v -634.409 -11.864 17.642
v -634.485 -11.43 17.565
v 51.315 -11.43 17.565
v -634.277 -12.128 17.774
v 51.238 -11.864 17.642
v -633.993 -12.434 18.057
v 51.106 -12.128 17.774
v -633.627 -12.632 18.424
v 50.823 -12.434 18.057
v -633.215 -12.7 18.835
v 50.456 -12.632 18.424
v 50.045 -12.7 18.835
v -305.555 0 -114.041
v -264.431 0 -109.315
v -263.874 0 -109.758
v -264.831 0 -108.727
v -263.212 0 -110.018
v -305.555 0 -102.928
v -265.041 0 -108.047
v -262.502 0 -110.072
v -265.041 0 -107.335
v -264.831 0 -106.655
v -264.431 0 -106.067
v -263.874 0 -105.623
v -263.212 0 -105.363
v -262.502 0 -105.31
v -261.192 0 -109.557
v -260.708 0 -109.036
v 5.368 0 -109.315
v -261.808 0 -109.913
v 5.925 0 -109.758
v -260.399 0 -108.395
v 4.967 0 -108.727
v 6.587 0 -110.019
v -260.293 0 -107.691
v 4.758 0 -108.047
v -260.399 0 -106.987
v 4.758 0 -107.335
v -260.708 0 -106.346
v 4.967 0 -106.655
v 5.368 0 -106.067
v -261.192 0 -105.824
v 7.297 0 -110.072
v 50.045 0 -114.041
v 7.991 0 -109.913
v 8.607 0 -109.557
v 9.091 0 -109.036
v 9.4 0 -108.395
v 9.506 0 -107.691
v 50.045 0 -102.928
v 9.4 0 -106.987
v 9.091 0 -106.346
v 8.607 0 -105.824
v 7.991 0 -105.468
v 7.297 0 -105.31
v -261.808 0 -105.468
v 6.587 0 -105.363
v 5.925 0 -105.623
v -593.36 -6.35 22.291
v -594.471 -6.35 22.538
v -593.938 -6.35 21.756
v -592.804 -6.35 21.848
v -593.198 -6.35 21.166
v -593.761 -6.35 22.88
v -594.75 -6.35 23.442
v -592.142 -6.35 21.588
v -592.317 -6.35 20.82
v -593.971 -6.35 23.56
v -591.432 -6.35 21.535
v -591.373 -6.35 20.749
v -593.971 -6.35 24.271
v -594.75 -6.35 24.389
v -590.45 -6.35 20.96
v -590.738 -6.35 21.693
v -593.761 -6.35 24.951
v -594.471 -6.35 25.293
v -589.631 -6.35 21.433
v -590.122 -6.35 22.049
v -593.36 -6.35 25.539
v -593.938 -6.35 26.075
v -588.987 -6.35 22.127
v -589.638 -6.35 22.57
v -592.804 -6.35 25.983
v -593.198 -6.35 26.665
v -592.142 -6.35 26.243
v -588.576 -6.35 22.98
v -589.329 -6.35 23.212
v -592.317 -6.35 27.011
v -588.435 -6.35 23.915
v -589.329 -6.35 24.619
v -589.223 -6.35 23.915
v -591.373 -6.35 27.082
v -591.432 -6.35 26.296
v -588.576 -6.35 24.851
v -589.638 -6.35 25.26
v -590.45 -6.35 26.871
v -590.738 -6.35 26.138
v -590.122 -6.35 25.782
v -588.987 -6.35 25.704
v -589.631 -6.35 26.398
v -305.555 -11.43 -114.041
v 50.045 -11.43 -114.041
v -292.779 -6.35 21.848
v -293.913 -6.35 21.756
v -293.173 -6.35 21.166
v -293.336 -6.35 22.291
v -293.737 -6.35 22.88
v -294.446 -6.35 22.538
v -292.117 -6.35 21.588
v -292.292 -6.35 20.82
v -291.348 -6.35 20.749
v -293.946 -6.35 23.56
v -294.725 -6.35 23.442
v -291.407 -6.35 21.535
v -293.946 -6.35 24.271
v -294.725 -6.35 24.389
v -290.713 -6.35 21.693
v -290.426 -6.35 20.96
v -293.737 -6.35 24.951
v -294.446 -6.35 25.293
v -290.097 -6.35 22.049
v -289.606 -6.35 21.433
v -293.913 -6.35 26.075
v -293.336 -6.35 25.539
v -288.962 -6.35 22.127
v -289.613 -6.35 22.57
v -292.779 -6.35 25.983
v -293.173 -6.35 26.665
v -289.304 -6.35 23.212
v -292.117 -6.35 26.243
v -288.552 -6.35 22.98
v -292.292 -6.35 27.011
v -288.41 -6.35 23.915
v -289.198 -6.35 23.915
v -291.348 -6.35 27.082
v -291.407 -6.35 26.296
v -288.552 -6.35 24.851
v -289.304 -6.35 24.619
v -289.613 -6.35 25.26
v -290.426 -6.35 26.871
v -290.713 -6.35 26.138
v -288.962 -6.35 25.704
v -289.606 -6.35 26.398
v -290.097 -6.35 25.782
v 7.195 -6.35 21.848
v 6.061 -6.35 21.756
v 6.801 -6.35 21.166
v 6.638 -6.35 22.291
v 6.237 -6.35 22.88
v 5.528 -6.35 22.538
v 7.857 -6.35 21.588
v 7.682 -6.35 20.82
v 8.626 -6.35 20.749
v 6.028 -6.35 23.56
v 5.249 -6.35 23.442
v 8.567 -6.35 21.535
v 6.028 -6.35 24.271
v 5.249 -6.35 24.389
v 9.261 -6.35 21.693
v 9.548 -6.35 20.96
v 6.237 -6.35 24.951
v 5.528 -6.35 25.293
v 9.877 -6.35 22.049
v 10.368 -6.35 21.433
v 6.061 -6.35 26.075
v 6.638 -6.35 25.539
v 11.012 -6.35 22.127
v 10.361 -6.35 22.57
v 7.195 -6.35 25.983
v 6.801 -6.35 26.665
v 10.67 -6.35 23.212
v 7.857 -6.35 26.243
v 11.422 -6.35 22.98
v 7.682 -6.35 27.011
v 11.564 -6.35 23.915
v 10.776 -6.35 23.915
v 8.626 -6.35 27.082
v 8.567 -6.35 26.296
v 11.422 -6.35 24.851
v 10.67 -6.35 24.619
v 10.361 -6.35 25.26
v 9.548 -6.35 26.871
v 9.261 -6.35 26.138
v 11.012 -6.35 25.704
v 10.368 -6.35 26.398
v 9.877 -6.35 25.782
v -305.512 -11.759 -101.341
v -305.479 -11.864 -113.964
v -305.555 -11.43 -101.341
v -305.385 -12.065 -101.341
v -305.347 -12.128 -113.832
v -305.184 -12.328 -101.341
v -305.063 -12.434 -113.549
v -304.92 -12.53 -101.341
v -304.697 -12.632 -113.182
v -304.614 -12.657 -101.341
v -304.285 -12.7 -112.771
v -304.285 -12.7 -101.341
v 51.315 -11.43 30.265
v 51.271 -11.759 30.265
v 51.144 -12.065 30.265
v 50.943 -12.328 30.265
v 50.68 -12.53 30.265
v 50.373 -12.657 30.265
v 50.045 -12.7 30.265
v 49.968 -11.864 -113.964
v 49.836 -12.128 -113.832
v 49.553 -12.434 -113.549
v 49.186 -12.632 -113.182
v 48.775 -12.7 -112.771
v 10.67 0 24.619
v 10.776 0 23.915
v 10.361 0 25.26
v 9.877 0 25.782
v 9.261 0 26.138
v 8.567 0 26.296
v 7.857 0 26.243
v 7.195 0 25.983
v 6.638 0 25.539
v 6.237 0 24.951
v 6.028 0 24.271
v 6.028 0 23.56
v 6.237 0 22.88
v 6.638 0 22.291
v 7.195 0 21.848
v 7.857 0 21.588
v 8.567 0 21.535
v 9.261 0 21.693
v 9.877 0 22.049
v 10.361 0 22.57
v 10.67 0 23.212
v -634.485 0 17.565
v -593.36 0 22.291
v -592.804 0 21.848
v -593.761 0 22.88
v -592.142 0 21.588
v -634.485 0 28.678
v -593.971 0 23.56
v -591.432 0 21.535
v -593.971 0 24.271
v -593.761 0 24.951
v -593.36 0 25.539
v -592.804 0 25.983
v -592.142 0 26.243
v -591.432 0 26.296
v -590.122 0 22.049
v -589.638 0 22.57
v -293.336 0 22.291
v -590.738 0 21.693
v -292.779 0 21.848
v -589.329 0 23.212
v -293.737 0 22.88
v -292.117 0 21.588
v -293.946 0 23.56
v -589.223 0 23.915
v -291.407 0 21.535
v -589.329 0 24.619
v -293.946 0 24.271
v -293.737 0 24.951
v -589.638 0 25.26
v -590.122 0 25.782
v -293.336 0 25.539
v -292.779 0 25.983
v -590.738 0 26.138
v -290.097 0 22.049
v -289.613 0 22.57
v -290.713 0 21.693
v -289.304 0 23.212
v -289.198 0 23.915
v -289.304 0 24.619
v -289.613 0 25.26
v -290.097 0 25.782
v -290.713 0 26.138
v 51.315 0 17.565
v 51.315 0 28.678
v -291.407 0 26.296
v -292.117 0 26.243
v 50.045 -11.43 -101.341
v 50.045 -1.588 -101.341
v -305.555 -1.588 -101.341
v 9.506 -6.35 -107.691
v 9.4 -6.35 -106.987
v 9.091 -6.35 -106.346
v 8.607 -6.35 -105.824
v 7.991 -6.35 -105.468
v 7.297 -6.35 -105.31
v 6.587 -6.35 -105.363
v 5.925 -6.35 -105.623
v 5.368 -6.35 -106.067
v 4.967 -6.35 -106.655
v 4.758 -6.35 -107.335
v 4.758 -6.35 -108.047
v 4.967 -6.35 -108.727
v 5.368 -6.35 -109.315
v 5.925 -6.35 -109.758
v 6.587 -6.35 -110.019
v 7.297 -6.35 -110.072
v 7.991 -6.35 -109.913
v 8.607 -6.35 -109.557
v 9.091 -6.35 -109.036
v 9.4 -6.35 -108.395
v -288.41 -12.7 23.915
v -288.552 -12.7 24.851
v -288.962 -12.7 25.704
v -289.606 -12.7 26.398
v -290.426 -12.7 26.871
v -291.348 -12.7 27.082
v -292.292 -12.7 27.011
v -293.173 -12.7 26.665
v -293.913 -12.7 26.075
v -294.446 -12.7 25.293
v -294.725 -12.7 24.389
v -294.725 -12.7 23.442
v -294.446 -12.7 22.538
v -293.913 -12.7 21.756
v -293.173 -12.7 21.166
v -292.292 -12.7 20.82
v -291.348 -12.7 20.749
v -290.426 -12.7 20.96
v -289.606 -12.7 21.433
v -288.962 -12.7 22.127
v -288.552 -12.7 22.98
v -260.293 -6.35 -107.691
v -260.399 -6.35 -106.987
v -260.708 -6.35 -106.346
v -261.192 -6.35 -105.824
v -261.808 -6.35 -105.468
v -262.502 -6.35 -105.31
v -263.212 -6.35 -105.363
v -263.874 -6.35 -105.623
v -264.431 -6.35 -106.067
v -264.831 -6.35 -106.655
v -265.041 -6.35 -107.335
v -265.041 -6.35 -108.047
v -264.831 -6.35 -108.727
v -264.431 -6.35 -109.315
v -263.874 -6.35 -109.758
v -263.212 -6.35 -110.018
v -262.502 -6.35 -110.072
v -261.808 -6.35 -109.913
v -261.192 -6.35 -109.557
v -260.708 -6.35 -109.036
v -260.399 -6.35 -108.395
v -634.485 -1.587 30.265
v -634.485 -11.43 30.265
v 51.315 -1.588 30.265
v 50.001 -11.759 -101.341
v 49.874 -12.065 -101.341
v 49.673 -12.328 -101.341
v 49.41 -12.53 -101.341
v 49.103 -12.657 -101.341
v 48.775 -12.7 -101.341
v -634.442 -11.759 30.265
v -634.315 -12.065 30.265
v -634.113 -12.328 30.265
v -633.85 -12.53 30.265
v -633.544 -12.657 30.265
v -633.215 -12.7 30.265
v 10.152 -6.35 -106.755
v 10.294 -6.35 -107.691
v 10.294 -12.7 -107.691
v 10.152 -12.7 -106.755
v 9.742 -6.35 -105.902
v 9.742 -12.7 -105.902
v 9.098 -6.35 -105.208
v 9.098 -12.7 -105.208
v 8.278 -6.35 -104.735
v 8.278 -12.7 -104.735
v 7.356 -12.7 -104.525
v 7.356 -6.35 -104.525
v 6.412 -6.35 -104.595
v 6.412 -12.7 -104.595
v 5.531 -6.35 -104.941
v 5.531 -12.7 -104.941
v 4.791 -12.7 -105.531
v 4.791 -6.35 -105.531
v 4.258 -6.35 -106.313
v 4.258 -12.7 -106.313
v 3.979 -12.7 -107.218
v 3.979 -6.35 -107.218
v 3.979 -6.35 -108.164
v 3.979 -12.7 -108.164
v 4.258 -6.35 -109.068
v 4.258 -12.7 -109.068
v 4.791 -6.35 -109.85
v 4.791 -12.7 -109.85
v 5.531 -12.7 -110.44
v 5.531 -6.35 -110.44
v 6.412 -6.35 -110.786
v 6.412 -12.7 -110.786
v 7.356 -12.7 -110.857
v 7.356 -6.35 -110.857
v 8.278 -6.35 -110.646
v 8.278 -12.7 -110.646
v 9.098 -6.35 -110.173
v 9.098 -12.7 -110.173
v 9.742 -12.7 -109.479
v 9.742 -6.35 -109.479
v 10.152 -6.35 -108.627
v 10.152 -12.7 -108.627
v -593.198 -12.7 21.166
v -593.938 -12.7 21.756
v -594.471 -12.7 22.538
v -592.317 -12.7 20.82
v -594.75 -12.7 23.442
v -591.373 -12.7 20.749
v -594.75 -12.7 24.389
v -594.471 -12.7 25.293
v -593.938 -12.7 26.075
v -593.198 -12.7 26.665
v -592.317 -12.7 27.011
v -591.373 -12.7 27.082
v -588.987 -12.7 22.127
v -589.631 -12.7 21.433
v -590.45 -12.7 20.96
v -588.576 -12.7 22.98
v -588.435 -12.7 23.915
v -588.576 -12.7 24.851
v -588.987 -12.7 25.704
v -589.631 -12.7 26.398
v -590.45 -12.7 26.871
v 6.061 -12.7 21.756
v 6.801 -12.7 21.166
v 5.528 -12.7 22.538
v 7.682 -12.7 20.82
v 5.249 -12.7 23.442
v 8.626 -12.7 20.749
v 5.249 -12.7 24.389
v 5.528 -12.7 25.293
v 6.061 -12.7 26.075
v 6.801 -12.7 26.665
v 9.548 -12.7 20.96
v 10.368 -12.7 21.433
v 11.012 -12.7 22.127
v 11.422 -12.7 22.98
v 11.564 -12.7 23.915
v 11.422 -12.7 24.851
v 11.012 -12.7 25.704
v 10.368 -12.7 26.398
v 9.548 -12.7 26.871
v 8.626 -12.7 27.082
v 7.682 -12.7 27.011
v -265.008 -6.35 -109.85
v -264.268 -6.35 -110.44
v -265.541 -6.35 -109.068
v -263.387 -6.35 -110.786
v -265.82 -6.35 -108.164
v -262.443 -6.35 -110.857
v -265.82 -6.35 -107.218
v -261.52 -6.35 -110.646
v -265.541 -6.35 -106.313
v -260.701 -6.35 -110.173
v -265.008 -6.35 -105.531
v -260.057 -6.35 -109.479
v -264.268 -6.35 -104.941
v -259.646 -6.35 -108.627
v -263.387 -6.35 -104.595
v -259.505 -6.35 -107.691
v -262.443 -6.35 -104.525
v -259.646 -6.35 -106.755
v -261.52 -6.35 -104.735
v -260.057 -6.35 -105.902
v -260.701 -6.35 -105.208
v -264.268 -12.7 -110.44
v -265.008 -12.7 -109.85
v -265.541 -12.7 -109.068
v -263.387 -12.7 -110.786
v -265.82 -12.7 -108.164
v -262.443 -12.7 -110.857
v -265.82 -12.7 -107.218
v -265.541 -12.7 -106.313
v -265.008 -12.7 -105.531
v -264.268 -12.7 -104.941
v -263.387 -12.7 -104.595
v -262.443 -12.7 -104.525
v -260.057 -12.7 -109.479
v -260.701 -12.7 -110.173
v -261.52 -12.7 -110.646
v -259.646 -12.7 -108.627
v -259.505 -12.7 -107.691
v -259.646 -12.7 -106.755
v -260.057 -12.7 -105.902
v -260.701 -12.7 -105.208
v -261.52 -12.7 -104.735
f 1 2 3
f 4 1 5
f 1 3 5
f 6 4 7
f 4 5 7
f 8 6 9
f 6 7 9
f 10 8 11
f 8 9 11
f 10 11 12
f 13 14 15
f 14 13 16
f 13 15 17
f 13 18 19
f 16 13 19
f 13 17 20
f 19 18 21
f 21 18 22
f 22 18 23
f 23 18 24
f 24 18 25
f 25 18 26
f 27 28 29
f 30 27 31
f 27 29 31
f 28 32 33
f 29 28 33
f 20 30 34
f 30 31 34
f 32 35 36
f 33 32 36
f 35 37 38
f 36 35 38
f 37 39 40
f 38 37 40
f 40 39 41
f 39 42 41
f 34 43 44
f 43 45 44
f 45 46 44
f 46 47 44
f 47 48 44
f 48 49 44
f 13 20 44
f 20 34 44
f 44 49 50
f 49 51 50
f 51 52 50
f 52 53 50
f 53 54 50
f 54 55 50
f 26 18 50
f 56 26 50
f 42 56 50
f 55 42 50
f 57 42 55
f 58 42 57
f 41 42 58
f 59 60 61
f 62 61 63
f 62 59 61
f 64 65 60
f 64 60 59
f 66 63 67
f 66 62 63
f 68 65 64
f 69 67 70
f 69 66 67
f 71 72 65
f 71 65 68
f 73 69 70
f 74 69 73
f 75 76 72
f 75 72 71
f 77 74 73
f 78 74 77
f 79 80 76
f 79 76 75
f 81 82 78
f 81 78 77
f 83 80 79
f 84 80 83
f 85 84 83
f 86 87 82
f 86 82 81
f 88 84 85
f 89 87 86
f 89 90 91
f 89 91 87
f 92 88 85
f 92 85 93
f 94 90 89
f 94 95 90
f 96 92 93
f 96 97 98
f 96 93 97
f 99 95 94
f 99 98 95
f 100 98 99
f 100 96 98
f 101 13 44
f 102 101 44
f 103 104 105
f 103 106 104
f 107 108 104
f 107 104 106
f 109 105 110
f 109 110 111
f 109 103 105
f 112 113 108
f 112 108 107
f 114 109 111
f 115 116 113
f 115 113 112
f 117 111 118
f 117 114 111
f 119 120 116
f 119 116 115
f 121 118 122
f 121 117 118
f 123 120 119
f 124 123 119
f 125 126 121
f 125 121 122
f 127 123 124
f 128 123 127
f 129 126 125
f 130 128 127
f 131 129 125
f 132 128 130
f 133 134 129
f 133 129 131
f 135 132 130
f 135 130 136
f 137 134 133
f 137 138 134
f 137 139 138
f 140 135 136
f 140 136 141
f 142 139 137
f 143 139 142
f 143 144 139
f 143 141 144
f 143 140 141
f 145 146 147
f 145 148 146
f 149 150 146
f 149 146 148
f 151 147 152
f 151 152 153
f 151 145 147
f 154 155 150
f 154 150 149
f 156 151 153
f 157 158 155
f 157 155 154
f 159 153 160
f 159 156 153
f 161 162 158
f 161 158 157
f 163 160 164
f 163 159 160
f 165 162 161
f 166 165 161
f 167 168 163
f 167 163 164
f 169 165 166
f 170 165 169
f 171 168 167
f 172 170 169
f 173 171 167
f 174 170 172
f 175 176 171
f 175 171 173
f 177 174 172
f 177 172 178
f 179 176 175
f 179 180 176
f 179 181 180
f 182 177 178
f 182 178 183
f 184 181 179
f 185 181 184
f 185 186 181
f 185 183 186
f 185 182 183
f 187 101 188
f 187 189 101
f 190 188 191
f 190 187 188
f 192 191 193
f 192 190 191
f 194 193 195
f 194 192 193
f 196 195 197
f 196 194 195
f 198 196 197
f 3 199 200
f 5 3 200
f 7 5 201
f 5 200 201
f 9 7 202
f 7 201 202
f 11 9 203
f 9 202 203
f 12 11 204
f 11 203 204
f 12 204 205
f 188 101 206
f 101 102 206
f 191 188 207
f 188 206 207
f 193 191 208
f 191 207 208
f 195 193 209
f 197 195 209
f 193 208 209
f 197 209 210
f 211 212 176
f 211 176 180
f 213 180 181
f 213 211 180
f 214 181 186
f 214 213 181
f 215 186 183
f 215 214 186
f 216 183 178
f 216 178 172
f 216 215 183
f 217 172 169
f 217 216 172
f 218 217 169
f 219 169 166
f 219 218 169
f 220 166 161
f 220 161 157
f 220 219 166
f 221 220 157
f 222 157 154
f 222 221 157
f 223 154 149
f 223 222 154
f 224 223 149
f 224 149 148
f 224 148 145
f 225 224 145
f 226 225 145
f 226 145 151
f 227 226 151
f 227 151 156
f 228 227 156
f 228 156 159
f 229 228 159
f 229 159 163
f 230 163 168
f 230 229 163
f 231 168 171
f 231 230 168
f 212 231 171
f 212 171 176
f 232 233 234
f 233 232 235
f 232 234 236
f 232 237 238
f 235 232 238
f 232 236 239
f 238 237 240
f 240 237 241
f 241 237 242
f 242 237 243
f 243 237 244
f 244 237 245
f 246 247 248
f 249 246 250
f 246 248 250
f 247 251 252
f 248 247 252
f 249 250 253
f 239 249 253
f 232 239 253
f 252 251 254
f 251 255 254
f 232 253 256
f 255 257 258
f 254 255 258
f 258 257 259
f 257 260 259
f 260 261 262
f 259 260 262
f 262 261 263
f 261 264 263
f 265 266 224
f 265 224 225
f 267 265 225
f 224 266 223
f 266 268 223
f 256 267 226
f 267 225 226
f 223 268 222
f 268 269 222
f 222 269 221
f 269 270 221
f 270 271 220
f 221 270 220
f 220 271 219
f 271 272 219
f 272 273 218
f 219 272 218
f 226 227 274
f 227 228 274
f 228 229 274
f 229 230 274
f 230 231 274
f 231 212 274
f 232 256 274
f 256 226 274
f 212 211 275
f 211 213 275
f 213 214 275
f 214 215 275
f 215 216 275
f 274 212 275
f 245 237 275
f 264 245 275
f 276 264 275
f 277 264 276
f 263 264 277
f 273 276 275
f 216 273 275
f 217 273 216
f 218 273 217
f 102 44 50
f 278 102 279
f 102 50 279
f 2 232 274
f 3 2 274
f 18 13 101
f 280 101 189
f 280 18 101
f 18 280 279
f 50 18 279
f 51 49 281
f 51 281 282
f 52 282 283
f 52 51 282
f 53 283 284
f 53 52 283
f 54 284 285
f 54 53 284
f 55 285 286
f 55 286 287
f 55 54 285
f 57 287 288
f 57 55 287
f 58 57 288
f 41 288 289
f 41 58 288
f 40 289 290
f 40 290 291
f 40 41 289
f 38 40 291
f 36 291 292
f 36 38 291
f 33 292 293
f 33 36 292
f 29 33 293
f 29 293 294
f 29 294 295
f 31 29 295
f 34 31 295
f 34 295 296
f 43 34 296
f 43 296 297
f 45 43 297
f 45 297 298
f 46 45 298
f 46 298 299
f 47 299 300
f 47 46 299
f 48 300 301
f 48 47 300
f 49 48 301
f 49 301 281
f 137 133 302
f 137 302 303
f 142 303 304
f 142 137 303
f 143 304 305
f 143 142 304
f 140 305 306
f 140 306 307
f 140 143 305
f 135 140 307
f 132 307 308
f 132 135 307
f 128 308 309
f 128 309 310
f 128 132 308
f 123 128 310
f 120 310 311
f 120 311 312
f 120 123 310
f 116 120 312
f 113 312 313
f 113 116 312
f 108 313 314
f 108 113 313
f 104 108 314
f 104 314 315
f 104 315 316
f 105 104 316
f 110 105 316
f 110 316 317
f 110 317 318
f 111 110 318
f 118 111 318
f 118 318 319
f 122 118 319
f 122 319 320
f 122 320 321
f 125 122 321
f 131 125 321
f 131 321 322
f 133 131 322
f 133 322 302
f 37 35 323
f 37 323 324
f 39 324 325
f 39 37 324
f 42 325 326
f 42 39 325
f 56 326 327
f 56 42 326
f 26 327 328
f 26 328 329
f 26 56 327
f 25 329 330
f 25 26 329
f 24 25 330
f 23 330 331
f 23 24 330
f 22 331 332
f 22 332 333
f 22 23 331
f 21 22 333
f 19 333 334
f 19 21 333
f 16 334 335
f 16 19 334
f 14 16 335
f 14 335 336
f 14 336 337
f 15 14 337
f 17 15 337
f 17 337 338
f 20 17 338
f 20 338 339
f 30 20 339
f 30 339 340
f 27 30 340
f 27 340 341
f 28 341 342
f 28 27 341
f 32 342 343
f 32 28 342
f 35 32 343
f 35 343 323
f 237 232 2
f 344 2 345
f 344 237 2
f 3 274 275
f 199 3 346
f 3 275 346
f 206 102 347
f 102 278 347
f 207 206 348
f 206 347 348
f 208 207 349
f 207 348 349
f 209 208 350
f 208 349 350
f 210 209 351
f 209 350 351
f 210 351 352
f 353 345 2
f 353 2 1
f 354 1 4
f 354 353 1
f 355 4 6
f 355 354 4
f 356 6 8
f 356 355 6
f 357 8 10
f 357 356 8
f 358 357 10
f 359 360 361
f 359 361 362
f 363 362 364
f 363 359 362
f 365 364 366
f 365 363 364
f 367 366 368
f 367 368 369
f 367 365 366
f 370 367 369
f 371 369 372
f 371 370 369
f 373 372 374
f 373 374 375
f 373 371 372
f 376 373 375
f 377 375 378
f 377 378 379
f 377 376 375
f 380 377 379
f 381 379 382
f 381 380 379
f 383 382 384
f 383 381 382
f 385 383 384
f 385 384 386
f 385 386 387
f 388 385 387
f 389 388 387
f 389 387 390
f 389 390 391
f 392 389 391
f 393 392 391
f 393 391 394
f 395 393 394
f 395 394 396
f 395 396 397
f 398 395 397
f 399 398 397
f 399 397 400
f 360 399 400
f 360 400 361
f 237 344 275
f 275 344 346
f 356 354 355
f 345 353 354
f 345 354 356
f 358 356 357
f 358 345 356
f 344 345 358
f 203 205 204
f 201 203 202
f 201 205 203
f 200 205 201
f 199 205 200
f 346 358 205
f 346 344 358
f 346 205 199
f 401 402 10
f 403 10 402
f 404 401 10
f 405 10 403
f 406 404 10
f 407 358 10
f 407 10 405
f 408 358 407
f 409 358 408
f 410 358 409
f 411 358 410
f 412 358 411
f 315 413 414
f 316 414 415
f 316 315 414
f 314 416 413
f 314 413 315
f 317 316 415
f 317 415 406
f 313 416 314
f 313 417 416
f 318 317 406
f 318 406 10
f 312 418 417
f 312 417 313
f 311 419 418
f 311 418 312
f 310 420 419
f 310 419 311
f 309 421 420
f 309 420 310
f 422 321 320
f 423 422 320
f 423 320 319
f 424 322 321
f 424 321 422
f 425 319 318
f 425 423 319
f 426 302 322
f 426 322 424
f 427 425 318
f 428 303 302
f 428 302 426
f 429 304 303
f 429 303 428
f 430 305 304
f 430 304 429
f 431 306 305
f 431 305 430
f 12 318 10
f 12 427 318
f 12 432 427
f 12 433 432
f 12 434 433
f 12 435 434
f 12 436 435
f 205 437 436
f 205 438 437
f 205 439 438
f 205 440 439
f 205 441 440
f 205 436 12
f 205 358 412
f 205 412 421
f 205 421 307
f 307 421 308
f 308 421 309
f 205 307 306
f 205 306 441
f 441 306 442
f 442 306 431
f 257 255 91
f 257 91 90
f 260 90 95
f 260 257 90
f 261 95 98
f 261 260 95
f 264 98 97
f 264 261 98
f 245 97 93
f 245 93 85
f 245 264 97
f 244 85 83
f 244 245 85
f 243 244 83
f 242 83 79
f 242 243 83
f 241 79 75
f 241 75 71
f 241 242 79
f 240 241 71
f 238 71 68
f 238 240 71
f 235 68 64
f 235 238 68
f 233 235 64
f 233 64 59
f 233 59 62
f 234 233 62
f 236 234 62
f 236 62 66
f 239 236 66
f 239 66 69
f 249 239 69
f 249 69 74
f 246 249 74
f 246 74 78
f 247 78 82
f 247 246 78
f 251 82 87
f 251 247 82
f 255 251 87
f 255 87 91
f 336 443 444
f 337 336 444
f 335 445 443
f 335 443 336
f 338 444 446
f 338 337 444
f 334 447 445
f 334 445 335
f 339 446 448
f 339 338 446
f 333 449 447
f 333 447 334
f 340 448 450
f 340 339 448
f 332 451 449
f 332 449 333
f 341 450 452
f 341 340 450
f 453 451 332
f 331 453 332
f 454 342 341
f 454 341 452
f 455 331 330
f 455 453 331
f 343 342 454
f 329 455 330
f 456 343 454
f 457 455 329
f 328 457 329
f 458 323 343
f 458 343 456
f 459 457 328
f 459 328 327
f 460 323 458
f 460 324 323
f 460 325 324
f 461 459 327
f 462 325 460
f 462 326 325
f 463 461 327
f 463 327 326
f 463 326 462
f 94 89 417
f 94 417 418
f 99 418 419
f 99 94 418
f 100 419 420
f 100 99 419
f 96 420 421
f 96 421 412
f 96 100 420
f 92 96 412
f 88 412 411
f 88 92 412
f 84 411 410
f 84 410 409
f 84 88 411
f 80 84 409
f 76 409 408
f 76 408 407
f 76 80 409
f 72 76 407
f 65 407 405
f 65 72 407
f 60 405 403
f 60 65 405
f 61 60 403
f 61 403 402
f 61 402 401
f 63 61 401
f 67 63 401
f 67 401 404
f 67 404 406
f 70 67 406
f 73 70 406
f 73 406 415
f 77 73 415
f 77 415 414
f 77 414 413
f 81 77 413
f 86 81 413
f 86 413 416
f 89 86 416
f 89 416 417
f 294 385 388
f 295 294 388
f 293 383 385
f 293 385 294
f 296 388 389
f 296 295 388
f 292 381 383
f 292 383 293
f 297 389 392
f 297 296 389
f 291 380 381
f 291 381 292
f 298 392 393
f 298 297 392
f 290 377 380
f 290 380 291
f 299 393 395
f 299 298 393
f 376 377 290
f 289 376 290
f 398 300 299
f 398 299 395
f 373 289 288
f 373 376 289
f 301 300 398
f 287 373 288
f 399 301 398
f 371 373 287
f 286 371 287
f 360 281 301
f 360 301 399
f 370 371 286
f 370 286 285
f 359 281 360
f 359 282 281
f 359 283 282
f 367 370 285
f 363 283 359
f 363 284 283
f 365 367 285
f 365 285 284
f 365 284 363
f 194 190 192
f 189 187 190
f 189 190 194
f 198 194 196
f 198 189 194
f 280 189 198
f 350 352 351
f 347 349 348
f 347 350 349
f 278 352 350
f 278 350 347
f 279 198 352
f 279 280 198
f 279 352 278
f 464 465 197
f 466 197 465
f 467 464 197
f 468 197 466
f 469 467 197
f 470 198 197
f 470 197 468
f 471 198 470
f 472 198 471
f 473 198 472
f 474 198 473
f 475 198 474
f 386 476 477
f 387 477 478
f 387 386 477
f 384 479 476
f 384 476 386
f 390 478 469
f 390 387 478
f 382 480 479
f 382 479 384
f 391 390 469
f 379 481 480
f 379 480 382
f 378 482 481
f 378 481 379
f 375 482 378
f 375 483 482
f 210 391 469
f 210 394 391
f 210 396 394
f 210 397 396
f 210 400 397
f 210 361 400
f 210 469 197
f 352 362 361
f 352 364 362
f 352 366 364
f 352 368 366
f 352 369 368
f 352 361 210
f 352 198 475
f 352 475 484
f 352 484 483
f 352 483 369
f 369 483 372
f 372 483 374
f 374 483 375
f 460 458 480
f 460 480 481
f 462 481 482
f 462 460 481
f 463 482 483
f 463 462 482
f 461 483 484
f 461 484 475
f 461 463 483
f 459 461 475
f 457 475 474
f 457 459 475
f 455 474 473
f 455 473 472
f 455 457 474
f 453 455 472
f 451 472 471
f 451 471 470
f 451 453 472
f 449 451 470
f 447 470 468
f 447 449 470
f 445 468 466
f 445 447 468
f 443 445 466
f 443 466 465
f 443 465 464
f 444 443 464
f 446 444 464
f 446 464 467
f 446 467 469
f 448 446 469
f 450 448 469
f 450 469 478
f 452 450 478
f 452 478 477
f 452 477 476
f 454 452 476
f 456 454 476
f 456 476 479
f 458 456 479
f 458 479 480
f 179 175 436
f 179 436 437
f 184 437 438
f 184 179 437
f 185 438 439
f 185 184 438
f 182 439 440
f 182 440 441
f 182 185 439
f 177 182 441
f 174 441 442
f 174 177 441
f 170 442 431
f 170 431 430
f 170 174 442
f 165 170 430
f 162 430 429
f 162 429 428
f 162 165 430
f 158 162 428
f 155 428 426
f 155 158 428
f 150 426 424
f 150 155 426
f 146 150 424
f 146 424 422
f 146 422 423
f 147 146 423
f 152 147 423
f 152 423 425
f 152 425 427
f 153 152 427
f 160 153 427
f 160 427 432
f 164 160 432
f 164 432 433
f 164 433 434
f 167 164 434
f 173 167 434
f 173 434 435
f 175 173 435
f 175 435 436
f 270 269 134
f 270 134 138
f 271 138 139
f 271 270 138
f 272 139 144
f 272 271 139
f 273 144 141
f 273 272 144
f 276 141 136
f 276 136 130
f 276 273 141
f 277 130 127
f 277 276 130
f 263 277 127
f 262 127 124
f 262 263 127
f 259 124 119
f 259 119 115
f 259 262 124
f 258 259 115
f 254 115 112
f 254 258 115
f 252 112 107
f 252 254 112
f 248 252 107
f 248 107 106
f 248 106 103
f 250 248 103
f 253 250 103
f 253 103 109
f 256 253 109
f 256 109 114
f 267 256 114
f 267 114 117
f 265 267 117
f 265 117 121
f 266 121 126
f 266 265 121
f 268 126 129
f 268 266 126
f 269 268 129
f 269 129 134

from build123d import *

# Parameters (mm, degrees)
F0_W      = 685.8
F0_H      = 12.7
F0_R      = 3.175
F1_DEPTH  = 12.7
F0_W_2    = 355.6
F0_R_2    = 2.3876
F2_DEPTH  = 6.35
F3_R      = 1.27
F3_2_R    = 1.27
F4_SIZE   = 1.5875
F4_2_SIZE = 1.5875


with BuildPart() as f1:
    # F0 (on Front) → F1 (new body)
    with BuildSketch(Plane.XZ):
        with Locations((-291.5854644343, 23.9154484641)):
            Rectangle(F0_W, F0_H)
        with Locations((-591.6102644343, 23.9154484641)):
            Circle(F0_R, mode=Mode.SUBTRACT)
        with Locations((-291.5854644343, 23.9154484641)):
            Circle(F0_R, mode=Mode.SUBTRACT)
        with Locations((8.3885355657, 23.9154484641)):
            Circle(F0_R, mode=Mode.SUBTRACT)
    extrude(amount=F1_DEPTH)

    # F0 (on Front) → F2 (join)
    with BuildSketch(Plane.XZ):
        with Locations((8.3885355657, 23.9154484641)):
            Circle(F0_R)
        with Locations((8.3885355657, 23.9154484641)):
            Circle(F0_R_2, mode=Mode.SUBTRACT)
        with Locations((-291.5854644343, 23.9154484641)):
            Circle(F0_R)
        with Locations((-291.5854644343, 23.9154484641)):
            Circle(F0_R_2, mode=Mode.SUBTRACT)
        with Locations((-591.6102644343, 23.9154484641)):
            Circle(F0_R)
        with Locations((-591.6102644343, 23.9154484641)):
            Circle(F0_R_2, mode=Mode.SUBTRACT)
    extrude(amount=F2_DEPTH)

    # F3#2
    f3_2_edges = [f1.edges().sort_by_distance(p)[0] for p in [
        (51.314536, -12.7, 23.915448),
        (-634.485464, -12.7, 23.915448),
        (-291.585464, -12.7, 17.565448),
    ]]
    fillet(f3_2_edges, radius=F3_2_R)

    # F4
    f4_edges = [f1.edges().sort_by_distance(p)[0] for p in [
        (-291.585464, 0, 30.265448),
    ]]
    chamfer(f4_edges, length=F4_SIZE)


with BuildPart() as f1b:
    # F0 (on Front) → F1, piece 2 (new body)
    with BuildSketch(Plane.XZ):
        with Locations((-127.7554926395, -107.6907621861)):
            Rectangle(F0_W_2, F0_H)
        with Locations((-262.6802926395, -107.6907590032)):
            Circle(F0_R, mode=Mode.SUBTRACT)
        with Locations((7.1185073605, -107.6907621861)):
            Circle(F0_R, mode=Mode.SUBTRACT)
    extrude(amount=F1_DEPTH)

    # F0 (on Front) → F2, piece 2 (join)
    with BuildSketch(Plane.XZ):
        with Locations((-262.6802926395, -107.6907590032)):
            Circle(F0_R)
        with Locations((-262.6802926395, -107.6907590032)):
            Circle(F0_R_2, mode=Mode.SUBTRACT)
        with Locations((7.1185073605, -107.6907621861)):
            Circle(F0_R)
        with Locations((7.1185073605, -107.6907621861)):
            Circle(F0_R_2, mode=Mode.SUBTRACT)
    extrude(amount=F2_DEPTH)

    # F3
    f3_edges = [f1b.edges().sort_by_distance(p)[0] for p in [
        (-127.755493, -12.7, -114.040762),
        (-305.555493, -12.7, -107.690762),
        (50.044507, -12.7, -107.690762),
    ]]
    fillet(f3_edges, radius=F3_R)

    # F4#2
    f4_2_edges = [f1b.edges().sort_by_distance(p)[0] for p in [
        (-127.755493, 0, -101.340762),
    ]]
    chamfer(f4_2_edges, length=F4_2_SIZE)


solid = Compound([f1.part, f1b.part])
